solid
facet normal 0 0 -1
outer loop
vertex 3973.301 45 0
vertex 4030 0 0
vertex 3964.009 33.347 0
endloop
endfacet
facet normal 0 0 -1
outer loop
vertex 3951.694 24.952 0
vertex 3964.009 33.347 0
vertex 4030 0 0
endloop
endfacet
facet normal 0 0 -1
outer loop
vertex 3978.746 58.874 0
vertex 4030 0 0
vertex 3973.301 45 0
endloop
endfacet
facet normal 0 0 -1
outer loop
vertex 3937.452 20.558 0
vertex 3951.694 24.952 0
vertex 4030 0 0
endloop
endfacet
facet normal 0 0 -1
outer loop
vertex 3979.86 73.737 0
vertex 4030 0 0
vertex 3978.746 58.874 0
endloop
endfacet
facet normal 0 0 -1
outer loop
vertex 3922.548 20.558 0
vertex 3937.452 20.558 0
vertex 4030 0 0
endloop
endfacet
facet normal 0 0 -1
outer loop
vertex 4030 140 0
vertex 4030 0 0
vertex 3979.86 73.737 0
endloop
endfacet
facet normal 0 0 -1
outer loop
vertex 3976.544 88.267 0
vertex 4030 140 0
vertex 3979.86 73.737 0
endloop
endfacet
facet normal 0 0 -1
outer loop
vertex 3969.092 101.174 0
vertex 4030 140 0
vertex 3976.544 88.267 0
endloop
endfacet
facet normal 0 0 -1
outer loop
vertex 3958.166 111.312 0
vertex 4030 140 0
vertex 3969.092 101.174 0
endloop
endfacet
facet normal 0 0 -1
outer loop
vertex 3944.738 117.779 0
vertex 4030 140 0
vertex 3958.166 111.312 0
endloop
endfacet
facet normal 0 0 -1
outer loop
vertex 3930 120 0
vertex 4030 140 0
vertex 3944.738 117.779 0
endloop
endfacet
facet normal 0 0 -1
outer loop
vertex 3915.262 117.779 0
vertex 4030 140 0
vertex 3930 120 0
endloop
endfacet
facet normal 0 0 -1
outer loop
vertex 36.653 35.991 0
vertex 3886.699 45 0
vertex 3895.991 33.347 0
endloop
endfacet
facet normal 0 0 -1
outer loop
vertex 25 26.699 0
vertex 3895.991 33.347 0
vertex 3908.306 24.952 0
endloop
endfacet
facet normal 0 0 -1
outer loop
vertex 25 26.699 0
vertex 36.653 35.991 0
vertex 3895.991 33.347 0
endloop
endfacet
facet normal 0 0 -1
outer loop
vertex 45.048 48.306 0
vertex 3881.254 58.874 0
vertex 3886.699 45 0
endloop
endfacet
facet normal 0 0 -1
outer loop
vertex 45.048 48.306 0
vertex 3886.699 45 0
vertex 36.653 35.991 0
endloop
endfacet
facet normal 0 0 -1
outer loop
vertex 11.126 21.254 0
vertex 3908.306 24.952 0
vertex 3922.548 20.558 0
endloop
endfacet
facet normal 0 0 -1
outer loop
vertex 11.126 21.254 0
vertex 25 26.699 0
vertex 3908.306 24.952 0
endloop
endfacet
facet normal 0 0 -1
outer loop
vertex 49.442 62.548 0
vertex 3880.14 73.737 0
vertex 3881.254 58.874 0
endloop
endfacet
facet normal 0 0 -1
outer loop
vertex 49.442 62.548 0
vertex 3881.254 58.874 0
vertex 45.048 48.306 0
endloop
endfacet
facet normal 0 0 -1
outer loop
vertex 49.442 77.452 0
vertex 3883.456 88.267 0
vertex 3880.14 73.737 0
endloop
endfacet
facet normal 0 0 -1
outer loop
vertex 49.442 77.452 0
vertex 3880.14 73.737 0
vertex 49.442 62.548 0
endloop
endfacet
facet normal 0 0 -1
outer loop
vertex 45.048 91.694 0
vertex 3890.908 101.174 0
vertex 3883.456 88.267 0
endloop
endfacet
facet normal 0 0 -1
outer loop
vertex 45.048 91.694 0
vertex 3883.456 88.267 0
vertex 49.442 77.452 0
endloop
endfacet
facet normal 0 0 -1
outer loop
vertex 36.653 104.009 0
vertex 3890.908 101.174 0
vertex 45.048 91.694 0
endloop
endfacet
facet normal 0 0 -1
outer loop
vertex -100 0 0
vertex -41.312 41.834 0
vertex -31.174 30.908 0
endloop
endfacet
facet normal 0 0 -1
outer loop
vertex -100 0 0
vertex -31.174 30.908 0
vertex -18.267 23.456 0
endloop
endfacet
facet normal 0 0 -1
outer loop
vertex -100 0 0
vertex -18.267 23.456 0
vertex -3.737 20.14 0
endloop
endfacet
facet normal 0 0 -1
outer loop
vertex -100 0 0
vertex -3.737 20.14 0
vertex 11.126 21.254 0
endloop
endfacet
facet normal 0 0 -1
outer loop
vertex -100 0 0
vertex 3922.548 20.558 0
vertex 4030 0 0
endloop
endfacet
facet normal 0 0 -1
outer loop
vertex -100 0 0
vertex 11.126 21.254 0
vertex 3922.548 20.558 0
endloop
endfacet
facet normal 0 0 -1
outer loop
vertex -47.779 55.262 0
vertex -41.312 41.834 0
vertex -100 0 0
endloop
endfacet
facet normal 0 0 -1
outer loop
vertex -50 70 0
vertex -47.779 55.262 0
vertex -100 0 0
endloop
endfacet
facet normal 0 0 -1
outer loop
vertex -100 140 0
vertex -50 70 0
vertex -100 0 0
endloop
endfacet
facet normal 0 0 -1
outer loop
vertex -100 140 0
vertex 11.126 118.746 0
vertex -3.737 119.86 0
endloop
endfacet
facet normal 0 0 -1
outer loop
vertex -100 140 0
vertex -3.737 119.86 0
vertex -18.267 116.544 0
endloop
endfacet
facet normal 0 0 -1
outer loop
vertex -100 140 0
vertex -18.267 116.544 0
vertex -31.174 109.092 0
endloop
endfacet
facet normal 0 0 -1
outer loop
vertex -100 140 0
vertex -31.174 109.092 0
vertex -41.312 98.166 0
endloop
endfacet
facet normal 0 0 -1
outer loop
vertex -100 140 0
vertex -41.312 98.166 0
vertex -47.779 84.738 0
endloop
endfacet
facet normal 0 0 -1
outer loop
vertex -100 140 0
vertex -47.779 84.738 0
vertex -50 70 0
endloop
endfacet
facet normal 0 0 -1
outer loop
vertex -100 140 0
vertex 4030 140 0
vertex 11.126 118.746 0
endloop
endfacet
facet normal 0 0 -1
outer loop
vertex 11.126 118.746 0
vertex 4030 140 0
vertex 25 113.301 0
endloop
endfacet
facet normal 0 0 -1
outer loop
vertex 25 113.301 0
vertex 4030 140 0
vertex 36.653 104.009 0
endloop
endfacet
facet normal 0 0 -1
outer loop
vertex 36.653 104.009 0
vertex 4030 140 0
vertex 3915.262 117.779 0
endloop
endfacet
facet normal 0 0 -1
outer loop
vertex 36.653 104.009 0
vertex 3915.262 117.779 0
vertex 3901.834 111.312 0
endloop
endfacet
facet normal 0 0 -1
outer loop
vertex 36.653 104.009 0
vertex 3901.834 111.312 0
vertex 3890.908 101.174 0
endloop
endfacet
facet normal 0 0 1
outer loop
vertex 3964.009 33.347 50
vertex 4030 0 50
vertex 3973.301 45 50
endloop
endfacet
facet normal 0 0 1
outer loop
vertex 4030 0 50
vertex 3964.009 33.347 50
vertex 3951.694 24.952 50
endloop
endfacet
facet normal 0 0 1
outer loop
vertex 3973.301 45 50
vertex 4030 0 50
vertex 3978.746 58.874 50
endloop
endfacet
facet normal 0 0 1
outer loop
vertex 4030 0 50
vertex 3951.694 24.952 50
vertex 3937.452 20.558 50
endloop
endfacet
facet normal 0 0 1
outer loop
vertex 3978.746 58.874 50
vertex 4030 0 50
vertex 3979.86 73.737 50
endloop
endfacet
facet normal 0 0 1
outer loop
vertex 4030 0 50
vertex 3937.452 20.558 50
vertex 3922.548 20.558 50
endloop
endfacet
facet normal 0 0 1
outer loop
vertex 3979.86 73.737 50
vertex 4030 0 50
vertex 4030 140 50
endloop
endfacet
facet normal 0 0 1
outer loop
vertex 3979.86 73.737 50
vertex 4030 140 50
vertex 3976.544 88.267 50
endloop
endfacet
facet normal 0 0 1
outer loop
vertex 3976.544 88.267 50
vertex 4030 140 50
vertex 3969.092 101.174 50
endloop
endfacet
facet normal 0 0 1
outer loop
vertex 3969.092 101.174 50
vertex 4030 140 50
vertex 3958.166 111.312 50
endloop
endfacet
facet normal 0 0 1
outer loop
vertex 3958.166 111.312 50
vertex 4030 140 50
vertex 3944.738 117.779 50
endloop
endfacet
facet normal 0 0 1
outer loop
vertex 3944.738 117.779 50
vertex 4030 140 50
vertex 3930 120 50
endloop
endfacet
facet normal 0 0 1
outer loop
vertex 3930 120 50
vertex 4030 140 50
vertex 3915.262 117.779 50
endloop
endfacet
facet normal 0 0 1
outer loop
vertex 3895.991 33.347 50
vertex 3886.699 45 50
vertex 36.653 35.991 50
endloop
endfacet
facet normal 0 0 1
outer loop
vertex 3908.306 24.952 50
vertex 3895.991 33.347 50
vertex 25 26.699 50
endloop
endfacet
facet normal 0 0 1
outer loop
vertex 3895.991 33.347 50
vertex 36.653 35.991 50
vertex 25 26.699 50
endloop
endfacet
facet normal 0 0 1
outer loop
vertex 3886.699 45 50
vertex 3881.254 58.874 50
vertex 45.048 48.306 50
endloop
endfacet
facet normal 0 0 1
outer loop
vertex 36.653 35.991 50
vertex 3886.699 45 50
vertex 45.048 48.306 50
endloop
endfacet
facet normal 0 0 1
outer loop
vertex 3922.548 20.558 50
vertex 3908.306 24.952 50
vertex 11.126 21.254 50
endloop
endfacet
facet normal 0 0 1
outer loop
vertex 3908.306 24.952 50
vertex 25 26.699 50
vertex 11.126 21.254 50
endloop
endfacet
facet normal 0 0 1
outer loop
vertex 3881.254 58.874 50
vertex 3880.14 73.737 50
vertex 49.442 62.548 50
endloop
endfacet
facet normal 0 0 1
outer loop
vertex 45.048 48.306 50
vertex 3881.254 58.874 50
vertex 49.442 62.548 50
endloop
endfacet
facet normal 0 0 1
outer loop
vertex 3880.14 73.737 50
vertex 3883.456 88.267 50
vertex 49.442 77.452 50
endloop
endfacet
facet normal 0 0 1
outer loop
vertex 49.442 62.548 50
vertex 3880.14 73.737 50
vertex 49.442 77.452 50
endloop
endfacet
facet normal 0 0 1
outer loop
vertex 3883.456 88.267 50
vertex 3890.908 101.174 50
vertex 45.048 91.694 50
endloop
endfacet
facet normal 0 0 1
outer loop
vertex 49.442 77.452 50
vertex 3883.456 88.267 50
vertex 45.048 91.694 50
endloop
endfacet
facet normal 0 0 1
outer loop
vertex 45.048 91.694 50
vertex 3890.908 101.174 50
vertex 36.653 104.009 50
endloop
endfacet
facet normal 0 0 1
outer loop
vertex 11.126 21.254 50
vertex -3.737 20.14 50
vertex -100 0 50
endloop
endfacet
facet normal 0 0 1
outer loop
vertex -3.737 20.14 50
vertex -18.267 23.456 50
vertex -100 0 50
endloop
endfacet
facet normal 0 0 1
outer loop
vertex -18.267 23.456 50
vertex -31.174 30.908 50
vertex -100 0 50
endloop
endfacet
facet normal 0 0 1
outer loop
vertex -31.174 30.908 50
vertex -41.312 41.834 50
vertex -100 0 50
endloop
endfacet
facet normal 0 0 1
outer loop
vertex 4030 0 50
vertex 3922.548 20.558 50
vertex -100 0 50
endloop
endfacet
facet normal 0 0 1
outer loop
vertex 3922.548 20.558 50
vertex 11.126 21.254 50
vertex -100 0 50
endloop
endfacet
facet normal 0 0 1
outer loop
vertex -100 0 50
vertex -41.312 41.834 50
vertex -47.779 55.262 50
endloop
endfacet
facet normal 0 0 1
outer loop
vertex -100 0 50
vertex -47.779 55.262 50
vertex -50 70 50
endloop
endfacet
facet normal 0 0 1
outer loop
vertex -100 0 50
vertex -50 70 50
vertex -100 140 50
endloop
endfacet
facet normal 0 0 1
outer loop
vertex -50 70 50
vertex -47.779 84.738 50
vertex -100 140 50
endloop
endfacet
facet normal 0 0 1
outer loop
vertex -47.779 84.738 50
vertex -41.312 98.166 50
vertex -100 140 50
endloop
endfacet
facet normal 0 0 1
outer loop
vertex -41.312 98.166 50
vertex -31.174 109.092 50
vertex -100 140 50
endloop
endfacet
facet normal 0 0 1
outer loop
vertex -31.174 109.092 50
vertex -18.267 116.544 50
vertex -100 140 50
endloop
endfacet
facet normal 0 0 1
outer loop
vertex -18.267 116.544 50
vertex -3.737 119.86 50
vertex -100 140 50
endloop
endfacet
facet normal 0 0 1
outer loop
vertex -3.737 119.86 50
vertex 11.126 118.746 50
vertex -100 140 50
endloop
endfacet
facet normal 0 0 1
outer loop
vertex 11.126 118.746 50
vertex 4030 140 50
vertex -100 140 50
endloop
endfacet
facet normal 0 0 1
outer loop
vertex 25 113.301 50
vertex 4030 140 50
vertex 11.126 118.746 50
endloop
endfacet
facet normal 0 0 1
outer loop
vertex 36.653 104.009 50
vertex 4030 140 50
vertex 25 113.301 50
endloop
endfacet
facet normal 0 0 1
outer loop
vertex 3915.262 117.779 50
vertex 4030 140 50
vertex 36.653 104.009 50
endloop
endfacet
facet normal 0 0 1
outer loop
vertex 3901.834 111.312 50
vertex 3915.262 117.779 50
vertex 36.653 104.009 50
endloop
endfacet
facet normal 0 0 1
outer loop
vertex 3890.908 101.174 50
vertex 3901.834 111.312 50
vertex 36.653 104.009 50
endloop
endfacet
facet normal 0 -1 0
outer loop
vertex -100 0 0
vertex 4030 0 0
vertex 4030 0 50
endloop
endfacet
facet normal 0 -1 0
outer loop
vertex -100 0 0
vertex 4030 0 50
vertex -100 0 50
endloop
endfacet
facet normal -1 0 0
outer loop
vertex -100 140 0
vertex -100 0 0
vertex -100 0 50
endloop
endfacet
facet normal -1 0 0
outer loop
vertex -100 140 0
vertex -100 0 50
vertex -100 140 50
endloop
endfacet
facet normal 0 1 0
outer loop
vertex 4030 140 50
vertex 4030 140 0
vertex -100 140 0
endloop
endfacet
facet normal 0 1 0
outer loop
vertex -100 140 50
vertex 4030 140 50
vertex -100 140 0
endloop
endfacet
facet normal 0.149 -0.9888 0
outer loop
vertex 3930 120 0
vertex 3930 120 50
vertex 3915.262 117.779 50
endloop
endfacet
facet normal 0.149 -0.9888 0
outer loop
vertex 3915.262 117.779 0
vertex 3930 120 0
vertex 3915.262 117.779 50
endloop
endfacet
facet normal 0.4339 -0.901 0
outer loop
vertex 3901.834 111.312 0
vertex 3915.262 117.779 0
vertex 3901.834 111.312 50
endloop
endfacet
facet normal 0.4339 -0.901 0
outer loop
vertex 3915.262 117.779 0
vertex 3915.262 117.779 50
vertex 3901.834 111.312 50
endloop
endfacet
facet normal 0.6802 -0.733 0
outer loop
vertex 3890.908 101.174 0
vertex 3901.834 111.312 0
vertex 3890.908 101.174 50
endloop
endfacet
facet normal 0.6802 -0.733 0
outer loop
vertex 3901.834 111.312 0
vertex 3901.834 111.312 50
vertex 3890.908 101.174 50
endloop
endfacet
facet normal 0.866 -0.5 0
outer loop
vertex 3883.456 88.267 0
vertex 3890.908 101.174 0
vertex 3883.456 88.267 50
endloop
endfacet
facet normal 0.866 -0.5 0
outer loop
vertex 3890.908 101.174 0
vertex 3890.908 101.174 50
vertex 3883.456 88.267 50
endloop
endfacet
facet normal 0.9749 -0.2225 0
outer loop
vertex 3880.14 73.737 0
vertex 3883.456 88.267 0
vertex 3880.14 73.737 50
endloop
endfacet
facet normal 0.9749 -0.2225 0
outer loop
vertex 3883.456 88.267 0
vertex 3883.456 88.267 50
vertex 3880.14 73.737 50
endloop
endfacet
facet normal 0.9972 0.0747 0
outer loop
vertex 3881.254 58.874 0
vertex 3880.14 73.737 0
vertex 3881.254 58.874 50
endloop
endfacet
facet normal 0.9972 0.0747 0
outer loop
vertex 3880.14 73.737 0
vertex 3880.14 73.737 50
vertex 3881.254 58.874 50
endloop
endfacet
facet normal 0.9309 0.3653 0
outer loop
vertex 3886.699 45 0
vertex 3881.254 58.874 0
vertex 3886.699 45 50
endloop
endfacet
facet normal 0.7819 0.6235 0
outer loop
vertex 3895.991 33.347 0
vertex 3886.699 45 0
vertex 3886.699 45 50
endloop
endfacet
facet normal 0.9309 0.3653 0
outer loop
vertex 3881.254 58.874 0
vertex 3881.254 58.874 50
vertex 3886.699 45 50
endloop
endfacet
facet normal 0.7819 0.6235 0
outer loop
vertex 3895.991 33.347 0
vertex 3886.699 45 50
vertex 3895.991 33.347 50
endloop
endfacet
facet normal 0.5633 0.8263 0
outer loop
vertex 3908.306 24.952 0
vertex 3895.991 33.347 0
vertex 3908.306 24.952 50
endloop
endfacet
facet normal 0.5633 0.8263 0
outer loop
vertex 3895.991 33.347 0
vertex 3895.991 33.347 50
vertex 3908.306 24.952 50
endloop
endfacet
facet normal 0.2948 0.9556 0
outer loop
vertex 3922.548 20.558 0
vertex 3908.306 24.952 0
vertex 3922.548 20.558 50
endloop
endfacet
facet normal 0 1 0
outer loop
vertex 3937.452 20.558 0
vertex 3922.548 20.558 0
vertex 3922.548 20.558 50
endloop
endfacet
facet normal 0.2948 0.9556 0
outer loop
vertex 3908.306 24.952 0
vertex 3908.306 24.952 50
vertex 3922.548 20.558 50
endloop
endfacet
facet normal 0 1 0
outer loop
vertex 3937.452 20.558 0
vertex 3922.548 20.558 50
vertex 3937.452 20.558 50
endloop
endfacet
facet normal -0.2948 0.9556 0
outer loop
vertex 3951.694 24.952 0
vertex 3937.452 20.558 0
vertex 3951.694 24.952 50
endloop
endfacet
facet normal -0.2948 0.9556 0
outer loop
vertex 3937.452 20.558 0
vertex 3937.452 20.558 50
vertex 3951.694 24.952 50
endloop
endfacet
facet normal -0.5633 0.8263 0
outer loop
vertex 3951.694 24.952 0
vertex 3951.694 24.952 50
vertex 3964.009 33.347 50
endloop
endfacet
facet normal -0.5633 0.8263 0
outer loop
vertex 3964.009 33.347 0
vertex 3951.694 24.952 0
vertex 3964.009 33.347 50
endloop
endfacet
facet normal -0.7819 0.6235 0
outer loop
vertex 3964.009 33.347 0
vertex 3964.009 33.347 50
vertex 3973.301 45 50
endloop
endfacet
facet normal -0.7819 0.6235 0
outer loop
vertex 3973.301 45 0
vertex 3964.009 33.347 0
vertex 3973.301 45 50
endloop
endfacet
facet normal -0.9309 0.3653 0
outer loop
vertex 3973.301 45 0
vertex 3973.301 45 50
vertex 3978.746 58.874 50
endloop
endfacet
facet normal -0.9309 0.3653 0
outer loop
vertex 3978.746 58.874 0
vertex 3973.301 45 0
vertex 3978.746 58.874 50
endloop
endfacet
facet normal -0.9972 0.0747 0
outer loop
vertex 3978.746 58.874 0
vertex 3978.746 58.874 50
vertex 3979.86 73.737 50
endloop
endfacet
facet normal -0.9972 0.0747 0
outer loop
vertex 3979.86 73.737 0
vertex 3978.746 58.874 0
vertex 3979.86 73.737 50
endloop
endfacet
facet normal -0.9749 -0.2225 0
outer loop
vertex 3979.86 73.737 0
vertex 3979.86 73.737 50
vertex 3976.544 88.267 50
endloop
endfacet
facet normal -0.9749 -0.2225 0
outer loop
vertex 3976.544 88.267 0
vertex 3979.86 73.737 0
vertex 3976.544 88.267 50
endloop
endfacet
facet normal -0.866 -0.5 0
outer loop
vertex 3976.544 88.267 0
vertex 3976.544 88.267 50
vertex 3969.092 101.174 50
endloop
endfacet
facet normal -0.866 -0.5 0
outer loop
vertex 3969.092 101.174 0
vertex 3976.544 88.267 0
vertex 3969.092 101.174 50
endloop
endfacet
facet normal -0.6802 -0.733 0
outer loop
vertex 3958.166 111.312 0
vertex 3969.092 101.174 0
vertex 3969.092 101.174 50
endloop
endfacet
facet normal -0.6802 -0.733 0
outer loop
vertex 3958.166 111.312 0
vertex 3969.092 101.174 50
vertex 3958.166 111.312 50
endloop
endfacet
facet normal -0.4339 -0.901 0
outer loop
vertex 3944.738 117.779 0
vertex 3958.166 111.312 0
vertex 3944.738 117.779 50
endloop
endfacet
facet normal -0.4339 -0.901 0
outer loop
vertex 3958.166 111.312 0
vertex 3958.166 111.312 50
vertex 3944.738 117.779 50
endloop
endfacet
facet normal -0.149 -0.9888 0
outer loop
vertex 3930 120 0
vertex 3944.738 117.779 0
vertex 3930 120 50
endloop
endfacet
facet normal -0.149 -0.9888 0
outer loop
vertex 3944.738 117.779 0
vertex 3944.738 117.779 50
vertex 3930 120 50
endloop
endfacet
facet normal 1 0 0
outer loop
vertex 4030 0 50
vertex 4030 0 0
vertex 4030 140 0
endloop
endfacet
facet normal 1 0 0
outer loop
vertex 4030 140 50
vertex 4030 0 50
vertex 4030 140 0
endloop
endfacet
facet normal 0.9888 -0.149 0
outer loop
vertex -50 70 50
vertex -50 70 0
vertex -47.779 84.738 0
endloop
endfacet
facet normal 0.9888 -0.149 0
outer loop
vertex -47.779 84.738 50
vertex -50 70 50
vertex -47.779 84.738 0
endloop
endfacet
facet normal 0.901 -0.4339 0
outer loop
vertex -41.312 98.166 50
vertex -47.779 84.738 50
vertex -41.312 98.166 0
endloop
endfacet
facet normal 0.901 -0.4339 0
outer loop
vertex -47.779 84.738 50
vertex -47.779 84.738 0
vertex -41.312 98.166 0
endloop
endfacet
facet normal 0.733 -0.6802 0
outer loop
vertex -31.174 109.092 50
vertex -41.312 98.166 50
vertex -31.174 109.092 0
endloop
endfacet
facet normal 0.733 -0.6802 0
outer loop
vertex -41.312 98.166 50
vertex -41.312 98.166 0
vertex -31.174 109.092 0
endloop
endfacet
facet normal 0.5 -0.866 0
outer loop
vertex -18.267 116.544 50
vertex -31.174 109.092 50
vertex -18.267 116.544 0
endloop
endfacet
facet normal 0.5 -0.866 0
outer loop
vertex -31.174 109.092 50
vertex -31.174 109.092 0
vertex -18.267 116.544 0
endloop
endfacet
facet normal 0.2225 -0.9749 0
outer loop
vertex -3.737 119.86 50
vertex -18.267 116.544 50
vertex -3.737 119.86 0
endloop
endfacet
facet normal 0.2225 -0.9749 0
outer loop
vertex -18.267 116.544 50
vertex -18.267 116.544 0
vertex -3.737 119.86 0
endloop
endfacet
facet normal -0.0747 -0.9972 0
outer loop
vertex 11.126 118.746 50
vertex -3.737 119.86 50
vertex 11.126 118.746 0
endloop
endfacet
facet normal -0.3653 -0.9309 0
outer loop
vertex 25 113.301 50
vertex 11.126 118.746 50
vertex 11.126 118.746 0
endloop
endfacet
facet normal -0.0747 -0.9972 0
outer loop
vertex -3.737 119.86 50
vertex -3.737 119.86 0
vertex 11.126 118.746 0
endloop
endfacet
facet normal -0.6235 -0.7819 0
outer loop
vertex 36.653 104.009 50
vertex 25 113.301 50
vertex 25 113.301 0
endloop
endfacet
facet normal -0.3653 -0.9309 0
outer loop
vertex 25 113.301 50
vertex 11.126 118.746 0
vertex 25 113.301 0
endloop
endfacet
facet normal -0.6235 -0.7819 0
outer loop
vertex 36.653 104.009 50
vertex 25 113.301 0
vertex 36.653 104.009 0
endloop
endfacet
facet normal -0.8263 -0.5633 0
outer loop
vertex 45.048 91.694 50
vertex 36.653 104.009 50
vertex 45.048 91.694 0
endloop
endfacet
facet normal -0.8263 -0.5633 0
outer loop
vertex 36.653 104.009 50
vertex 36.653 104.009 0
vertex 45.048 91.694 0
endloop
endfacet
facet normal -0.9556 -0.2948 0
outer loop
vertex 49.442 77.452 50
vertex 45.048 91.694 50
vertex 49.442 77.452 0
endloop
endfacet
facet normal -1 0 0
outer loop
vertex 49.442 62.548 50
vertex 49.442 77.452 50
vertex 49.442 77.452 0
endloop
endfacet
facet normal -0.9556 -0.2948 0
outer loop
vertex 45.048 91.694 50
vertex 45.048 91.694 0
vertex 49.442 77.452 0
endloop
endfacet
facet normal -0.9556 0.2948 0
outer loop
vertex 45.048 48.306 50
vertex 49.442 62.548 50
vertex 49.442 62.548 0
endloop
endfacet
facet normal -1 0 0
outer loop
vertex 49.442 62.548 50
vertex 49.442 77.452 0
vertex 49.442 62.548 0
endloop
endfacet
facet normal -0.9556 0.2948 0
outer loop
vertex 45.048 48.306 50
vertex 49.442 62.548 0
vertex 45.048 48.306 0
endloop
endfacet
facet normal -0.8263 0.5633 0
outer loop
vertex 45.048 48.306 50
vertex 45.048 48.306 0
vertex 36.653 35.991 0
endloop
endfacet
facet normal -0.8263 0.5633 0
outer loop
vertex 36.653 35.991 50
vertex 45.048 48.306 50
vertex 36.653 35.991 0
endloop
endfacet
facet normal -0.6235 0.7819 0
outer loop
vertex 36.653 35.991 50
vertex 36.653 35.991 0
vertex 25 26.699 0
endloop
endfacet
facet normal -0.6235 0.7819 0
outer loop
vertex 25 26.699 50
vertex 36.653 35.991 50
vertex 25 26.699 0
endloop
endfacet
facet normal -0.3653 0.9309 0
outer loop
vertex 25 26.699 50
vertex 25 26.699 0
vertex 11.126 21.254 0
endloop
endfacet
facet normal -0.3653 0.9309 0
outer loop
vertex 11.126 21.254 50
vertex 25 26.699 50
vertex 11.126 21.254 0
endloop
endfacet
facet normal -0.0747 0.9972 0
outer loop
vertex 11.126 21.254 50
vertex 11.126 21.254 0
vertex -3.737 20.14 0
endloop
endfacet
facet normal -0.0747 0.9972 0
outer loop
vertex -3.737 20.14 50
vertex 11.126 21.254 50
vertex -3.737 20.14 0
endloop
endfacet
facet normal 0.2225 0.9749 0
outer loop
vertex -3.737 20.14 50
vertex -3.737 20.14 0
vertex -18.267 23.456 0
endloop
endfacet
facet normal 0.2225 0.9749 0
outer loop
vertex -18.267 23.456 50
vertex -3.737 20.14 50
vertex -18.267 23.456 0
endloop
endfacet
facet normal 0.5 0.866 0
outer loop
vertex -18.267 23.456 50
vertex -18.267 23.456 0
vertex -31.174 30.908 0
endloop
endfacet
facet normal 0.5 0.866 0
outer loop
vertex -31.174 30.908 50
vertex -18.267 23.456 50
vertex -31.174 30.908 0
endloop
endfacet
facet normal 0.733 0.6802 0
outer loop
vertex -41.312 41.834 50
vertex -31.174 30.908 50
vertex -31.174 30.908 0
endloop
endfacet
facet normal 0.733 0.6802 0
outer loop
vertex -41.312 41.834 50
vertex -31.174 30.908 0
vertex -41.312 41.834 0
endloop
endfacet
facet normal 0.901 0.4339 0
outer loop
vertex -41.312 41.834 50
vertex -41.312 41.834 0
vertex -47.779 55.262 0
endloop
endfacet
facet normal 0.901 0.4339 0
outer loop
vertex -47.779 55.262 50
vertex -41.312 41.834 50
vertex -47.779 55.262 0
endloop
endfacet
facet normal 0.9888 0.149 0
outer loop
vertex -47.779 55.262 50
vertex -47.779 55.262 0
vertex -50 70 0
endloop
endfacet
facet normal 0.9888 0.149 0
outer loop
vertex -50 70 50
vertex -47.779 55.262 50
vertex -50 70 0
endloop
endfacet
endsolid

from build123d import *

# Parameters (mm, degrees)
SKETCH1_W           = 3930
SKETCH1_H           = 140
BOSS_EXTRUDE1_DEPTH = 50
SKETCH2_R           = 50
CUT_EXTRUDE1_DEPTH  = 50
SKETCH3_W           = 100
SKETCH3_H           = 140
BOSS_EXTRUDE2_DEPTH = 50
SKETCH4_R           = 50
CUT_EXTRUDE2_DEPTH  = 51


with BuildPart() as part:
    # Sketch1 → Boss-Extrude1 (new body)
    with BuildSketch(Plane.XY):
        with Locations((1965, 70)):
            Rectangle(SKETCH1_W, SKETCH1_H)
    extrude(amount=BOSS_EXTRUDE1_DEPTH)

    # Sketch2 → Cut-Extrude1 (cut)
    with BuildSketch(Plane.XY.offset(50)):
        with Locations((3930, 70)):
            Circle(SKETCH2_R)
        with Locations((0, 70)):
            Circle(SKETCH2_R)
    extrude(amount=-CUT_EXTRUDE1_DEPTH, mode=Mode.SUBTRACT)

    # Sketch3 → Boss-Extrude2 (add, through all)
    with BuildSketch(Plane(origin=(0, 0, 0), x_dir=(-1, 0, 0), z_dir=(0, 0, -1))):
        with Locations((-3980, 70)):
            Rectangle(SKETCH3_W, SKETCH3_H)
        with Locations((50, 70)):
            Rectangle(SKETCH3_W, SKETCH3_H)
    extrude(amount=-BOSS_EXTRUDE2_DEPTH)

    # Sketch4 → Cut-Extrude2 (cut, through all)
    with BuildSketch(Plane(origin=(0, 0, 0), x_dir=(-1, 0, 0), z_dir=(0, 0, -1))):
        with Locations((0, 70)):
            Circle(SKETCH4_R)
        with Locations((-3930, 70)):
            Circle(SKETCH4_R)
    extrude(amount=-CUT_EXTRUDE2_DEPTH, mode=Mode.SUBTRACT)


solid = part.part
